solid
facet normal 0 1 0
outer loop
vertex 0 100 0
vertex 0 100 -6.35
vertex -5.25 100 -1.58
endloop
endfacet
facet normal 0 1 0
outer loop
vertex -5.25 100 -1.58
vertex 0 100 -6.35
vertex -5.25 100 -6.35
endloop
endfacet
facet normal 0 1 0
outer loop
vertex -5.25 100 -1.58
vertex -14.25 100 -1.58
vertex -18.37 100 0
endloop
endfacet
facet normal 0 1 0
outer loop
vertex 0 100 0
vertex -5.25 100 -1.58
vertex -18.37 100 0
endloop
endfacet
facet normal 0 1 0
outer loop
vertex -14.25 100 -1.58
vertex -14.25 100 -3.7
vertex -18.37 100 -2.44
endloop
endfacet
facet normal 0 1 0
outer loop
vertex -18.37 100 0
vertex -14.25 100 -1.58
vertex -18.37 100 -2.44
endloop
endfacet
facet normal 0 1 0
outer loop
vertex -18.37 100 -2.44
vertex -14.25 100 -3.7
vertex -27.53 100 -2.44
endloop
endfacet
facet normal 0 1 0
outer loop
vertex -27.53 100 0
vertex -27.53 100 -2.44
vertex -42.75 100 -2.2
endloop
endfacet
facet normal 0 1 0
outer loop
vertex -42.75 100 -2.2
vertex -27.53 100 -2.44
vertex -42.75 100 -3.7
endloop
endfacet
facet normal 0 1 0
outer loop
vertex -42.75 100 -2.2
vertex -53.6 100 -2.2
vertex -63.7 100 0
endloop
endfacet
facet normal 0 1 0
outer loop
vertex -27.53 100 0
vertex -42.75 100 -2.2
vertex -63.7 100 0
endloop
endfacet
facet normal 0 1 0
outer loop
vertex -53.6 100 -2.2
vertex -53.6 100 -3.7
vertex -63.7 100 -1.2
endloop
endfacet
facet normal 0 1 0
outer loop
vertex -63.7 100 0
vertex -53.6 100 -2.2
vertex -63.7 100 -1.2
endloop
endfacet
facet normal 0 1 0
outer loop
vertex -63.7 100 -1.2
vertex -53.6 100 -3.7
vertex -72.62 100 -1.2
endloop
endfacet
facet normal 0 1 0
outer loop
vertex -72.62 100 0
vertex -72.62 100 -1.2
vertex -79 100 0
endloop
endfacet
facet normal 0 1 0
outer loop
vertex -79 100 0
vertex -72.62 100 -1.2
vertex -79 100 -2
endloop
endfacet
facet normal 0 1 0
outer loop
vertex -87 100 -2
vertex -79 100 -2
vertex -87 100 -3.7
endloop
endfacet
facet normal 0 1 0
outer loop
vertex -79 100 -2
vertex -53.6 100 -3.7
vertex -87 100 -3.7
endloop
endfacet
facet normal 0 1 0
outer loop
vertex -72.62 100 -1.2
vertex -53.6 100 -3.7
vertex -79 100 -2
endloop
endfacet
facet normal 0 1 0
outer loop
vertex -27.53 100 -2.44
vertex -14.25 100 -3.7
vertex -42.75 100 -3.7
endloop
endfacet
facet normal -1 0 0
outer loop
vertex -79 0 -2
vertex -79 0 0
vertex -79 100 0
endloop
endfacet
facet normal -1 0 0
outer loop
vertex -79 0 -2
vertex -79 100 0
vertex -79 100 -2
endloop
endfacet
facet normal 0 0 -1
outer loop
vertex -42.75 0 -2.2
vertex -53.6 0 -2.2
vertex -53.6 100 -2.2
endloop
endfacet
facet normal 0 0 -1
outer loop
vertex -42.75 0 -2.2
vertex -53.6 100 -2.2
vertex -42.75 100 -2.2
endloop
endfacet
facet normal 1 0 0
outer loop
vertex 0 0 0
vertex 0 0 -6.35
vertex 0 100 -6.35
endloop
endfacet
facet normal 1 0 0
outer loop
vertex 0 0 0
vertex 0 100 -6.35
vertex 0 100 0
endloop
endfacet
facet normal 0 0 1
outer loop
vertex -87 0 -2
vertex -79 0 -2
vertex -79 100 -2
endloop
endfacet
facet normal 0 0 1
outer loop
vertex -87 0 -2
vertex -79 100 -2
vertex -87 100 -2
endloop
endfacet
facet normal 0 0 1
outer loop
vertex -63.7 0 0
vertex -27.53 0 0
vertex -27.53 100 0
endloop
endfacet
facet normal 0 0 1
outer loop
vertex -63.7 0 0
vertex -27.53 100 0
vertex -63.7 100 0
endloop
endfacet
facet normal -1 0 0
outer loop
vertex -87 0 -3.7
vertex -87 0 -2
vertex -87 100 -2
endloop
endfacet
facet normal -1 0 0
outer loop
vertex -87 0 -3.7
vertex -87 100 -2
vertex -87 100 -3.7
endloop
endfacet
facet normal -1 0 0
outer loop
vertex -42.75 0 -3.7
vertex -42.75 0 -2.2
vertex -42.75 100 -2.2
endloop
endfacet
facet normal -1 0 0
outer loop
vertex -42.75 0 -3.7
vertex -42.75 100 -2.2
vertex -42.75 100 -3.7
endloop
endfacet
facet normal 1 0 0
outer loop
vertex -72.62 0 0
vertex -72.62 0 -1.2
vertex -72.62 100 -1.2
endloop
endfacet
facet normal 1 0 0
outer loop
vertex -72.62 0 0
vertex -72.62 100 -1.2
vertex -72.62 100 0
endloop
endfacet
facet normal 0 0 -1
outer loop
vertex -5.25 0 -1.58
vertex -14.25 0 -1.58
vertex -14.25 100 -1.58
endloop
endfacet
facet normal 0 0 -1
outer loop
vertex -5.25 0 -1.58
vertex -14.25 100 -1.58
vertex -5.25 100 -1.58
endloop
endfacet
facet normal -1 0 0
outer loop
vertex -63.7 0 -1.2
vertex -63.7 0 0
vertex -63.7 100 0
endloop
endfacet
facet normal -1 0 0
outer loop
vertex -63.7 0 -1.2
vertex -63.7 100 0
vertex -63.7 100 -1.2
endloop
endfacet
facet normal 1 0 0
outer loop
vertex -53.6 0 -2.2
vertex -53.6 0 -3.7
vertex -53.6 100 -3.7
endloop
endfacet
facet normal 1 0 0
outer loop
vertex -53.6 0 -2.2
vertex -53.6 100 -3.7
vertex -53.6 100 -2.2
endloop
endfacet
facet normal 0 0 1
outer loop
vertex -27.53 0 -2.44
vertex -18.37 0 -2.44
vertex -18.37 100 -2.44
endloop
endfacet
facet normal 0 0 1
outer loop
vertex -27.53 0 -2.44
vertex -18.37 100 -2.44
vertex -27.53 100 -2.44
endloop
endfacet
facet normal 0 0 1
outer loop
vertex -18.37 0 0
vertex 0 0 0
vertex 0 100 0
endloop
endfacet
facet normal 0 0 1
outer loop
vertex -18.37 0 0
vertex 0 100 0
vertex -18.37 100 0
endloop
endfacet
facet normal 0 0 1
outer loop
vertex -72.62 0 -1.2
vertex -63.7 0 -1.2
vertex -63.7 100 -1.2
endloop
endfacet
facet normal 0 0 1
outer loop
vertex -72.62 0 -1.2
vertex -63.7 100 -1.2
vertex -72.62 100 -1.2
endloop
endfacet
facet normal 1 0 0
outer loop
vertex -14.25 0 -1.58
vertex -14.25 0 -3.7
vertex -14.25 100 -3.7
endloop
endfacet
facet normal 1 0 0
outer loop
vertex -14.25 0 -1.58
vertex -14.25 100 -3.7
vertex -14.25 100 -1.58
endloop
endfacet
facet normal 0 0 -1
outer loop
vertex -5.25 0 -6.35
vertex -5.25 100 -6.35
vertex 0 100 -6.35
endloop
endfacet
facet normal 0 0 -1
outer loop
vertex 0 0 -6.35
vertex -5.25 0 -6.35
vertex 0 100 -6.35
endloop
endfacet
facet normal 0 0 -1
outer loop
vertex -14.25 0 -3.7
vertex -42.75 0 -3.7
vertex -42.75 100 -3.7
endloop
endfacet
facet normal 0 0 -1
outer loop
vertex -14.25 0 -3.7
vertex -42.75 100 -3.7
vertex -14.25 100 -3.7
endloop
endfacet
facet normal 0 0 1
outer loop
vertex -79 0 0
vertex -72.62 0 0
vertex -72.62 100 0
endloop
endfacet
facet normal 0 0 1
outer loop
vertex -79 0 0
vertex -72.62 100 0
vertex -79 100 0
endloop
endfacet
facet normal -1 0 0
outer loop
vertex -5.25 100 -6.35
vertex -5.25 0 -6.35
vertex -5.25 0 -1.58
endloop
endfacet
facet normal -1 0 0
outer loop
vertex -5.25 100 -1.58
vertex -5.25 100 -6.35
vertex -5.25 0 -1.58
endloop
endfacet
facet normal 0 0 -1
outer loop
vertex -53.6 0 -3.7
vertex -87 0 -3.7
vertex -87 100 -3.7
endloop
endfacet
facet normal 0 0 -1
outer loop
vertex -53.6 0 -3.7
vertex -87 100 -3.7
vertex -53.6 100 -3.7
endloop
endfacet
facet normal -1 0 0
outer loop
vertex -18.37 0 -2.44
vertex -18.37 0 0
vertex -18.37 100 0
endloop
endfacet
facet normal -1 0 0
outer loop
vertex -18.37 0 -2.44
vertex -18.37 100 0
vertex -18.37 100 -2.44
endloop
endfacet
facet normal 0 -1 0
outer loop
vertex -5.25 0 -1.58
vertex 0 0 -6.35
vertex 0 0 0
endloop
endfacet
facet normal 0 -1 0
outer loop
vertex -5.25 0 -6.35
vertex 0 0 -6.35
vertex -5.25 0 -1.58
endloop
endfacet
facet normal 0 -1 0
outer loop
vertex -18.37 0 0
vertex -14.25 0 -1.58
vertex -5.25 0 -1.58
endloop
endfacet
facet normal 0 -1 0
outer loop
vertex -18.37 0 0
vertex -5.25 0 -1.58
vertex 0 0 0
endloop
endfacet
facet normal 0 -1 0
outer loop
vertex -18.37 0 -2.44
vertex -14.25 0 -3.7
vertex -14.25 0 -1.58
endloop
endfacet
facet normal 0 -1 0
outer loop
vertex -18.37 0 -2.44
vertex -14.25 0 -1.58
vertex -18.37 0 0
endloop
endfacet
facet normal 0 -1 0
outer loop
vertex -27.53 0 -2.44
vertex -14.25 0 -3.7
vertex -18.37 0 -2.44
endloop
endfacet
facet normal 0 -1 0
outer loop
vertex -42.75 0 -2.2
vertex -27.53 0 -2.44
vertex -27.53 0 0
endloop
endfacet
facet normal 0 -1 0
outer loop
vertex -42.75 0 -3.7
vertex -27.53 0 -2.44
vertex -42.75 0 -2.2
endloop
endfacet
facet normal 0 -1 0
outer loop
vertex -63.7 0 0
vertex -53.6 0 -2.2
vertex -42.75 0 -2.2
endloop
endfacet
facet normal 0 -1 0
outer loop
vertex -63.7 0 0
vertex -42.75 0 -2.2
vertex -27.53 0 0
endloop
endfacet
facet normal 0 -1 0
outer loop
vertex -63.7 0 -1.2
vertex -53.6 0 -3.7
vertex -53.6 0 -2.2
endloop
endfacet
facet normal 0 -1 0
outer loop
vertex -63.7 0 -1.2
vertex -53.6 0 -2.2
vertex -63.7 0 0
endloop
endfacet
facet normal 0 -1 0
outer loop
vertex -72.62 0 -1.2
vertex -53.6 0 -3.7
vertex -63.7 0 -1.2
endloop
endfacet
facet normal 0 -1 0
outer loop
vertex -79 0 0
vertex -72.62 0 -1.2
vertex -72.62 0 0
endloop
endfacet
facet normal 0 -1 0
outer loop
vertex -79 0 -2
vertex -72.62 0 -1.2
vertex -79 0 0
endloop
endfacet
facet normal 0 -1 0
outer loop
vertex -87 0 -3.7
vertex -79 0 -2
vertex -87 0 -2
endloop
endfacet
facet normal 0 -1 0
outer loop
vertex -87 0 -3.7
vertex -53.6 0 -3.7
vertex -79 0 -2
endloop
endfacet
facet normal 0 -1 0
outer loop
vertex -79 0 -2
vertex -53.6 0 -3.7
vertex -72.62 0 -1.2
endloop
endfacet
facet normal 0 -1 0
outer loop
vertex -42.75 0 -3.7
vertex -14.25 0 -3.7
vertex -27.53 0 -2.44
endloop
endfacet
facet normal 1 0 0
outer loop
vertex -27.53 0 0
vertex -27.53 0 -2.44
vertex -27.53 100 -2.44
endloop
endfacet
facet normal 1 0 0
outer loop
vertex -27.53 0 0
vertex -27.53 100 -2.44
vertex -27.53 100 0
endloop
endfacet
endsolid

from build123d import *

# Parameters (mm, degrees)
BOSS_EXTRUDE1_DEPTH = 100


with BuildPart() as part:
    # Sketch1 → Boss-Extrude1 (new body)
    with BuildSketch(Plane(origin=(0, 0, 0), x_dir=(1, 0, 0), z_dir=(0, 1, 0))):
        Polygon((-87, 3.7), (-53.6, 3.7), (-53.6, 2.2), (-42.75, 2.2), (-42.75, 3.7), (-14.25, 3.7), (-14.25, 1.58), (-5.25, 1.58), (-5.25, 3.7), (-5.25, 6.35), (0, 6.35), (0, 0), (-18.37, 0), (-18.37, 2.44), (-27.53, 2.44), (-27.53, 0), (-63.7, 0), (-63.7, 1.2), (-72.62, 1.2), (-72.62, 0), (-79, 0), (-79, 2), (-87, 2), align=None)
    extrude(amount=BOSS_EXTRUDE1_DEPTH)


solid = part.part
